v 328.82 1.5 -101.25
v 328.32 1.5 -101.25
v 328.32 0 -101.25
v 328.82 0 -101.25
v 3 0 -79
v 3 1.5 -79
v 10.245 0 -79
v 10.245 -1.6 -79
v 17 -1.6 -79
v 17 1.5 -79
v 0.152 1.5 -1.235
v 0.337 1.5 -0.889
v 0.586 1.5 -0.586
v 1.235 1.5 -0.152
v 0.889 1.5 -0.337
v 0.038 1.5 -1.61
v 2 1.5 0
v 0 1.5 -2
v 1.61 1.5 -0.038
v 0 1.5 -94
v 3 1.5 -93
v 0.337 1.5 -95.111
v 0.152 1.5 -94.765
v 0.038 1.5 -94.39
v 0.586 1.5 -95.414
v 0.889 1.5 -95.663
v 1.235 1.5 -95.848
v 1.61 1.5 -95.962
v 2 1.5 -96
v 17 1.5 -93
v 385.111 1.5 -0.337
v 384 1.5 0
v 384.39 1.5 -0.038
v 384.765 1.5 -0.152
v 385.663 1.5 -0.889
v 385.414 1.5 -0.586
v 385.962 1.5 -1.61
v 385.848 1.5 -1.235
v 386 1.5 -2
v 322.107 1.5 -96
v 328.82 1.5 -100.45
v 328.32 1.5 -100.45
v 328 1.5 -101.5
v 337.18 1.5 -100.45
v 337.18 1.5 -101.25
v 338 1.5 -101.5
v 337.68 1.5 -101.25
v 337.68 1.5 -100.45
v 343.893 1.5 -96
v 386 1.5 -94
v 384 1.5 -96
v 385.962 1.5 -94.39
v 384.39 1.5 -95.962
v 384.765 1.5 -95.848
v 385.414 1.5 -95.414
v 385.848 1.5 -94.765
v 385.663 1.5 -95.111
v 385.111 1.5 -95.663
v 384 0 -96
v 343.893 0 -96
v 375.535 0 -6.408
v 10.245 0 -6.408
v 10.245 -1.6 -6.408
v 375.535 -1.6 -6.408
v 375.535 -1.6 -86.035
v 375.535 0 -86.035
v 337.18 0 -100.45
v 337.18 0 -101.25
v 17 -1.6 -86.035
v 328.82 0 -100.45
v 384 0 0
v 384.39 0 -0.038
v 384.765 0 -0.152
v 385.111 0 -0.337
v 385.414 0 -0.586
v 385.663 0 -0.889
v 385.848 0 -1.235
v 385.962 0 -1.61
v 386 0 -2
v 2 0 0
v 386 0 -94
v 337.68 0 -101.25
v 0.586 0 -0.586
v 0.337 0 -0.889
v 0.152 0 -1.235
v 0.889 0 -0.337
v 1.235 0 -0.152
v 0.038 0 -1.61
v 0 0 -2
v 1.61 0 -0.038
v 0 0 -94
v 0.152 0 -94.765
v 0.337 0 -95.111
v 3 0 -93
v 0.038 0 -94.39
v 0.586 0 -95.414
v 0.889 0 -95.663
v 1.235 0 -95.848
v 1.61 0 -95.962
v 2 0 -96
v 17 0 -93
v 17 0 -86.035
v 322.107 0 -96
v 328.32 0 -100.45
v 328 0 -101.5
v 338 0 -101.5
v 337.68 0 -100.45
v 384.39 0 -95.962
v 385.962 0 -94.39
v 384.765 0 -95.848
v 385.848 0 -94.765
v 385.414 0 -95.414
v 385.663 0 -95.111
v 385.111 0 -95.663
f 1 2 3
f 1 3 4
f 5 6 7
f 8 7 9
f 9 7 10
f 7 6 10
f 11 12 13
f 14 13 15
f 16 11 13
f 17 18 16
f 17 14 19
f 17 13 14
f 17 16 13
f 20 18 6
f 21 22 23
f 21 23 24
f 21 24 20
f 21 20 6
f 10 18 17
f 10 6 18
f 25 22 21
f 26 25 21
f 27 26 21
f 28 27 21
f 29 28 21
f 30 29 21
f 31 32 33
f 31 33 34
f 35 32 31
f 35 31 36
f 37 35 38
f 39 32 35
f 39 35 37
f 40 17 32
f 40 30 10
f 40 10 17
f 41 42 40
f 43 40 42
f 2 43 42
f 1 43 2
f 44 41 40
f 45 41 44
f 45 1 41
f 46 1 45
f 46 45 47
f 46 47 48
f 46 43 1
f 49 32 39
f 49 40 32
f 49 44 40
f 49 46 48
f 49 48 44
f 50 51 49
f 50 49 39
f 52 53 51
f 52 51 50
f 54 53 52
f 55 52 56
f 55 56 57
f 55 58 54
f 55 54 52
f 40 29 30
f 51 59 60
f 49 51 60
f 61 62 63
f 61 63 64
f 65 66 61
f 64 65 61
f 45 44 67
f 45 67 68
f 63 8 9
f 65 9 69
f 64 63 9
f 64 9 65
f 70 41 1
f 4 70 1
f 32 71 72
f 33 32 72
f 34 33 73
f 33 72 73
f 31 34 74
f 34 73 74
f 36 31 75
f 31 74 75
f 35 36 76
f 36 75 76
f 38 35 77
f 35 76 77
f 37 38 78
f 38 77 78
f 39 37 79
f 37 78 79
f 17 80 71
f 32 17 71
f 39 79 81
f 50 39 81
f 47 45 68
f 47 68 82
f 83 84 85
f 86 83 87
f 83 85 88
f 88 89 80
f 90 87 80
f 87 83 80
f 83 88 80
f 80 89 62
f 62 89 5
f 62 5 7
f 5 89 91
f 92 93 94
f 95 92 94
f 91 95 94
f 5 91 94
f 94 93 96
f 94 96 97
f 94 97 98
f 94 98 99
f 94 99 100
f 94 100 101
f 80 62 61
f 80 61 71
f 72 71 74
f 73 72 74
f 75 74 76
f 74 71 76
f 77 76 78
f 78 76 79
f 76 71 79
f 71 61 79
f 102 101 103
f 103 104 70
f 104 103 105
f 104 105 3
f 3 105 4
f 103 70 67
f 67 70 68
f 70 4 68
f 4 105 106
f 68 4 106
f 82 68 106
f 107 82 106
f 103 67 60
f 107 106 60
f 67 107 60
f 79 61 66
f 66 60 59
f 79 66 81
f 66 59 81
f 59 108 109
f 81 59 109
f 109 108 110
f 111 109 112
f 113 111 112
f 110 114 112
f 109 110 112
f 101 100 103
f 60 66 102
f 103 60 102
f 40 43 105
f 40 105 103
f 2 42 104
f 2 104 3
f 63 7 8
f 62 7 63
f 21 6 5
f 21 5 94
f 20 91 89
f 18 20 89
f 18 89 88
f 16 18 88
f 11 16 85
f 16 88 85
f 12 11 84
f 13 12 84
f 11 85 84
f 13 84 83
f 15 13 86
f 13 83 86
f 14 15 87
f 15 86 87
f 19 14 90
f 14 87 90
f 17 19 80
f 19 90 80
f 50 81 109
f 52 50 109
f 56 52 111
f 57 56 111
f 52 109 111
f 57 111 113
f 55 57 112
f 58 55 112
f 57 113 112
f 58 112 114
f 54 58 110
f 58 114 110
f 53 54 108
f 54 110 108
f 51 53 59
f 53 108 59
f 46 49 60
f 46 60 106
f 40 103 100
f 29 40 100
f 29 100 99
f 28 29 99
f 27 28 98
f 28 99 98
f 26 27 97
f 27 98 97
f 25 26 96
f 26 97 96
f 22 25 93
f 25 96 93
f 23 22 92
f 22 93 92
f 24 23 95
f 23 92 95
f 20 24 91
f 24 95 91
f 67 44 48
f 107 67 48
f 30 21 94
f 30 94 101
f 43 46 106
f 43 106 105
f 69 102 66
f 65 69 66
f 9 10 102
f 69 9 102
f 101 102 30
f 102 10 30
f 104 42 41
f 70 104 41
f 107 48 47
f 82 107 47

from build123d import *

# Parameters (mm, degrees)
BOSS_EXTRUDE1_DEPTH = 1.5
BOSS_EXTRUDE2_DEPTH = 1.5
SKETCH3_W           = 0.5
SKETCH3_H           = 0.8
CUT_EXTRUDE1_DEPTH  = 400.124667241
SKETCH4_W           = 365.290263007
SKETCH4_H           = 79.626519776
BOSS_EXTRUDE3_DEPTH = 1.6
SKETCH5_W           = 14
SKETCH5_H           = 14
CUT_EXTRUDE2_DEPTH  = 400.133887311


with BuildPart() as part:
    # Sketch1 → Boss-Extrude1 (new body)
    with BuildSketch(Plane(origin=(0, 0, 0), x_dir=(1, 0, 0), z_dir=(0, 1, 0))):
        with BuildLine():
            Line((2, 0), (384, 0))
            ThreePointArc((384, 0), (385.414213562, 0.585786438), (386, 2))
            Line((386, 2), (386, 94))
            ThreePointArc((386, 94), (385.414213562, 95.414213562), (384, 96))
            Line((384, 96), (2, 96))
            ThreePointArc((2, 96), (0.585786438, 95.414213562), (0, 94))
            Line((0, 94), (0, 2))
            ThreePointArc((0, 2), (0.585786438, 0.585786438), (2, 0))
        make_face()
    extrude(amount=BOSS_EXTRUDE1_DEPTH)

    # Sketch2 → Boss-Extrude2 (add)
    with BuildSketch(Plane(origin=(0, 1.5, 0), x_dir=(1, 0, 0), z_dir=(0, 1, 0))):
        Polygon((343.8928, 96), (338, 101.5), (328, 101.5), (322.1072, 96), align=None)
    extrude(amount=-BOSS_EXTRUDE2_DEPTH)

    # Sketch3 → Cut-Extrude1 (cut, through all)
    with BuildSketch(Plane(origin=(0, 1.5, 0), x_dir=(1, 0, 0), z_dir=(0, 1, 0))):
        with Locations((328.57, 100.85)):
            Rectangle(SKETCH3_W, SKETCH3_H)
        with Locations((337.43, 100.85)):
            Rectangle(SKETCH3_W, SKETCH3_H)
    extrude(amount=-CUT_EXTRUDE1_DEPTH, mode=Mode.SUBTRACT)

    # Sketch4 → Boss-Extrude3 (add)
    with BuildSketch(Plane.XZ):
        with Locations((192.889995692, -46.221612613)):
            Rectangle(SKETCH4_W, SKETCH4_H)
    extrude(amount=BOSS_EXTRUDE3_DEPTH)

    # Sketch5 → Cut-Extrude2 (cut, through all)
    with BuildSketch(Plane(origin=(0, 1.5, 0), x_dir=(1, 0, 0), z_dir=(0, 1, 0))):
        with Locations((10, 86)):
            Rectangle(SKETCH5_W, SKETCH5_H)
    extrude(amount=-CUT_EXTRUDE2_DEPTH, mode=Mode.SUBTRACT)


solid = part.part
